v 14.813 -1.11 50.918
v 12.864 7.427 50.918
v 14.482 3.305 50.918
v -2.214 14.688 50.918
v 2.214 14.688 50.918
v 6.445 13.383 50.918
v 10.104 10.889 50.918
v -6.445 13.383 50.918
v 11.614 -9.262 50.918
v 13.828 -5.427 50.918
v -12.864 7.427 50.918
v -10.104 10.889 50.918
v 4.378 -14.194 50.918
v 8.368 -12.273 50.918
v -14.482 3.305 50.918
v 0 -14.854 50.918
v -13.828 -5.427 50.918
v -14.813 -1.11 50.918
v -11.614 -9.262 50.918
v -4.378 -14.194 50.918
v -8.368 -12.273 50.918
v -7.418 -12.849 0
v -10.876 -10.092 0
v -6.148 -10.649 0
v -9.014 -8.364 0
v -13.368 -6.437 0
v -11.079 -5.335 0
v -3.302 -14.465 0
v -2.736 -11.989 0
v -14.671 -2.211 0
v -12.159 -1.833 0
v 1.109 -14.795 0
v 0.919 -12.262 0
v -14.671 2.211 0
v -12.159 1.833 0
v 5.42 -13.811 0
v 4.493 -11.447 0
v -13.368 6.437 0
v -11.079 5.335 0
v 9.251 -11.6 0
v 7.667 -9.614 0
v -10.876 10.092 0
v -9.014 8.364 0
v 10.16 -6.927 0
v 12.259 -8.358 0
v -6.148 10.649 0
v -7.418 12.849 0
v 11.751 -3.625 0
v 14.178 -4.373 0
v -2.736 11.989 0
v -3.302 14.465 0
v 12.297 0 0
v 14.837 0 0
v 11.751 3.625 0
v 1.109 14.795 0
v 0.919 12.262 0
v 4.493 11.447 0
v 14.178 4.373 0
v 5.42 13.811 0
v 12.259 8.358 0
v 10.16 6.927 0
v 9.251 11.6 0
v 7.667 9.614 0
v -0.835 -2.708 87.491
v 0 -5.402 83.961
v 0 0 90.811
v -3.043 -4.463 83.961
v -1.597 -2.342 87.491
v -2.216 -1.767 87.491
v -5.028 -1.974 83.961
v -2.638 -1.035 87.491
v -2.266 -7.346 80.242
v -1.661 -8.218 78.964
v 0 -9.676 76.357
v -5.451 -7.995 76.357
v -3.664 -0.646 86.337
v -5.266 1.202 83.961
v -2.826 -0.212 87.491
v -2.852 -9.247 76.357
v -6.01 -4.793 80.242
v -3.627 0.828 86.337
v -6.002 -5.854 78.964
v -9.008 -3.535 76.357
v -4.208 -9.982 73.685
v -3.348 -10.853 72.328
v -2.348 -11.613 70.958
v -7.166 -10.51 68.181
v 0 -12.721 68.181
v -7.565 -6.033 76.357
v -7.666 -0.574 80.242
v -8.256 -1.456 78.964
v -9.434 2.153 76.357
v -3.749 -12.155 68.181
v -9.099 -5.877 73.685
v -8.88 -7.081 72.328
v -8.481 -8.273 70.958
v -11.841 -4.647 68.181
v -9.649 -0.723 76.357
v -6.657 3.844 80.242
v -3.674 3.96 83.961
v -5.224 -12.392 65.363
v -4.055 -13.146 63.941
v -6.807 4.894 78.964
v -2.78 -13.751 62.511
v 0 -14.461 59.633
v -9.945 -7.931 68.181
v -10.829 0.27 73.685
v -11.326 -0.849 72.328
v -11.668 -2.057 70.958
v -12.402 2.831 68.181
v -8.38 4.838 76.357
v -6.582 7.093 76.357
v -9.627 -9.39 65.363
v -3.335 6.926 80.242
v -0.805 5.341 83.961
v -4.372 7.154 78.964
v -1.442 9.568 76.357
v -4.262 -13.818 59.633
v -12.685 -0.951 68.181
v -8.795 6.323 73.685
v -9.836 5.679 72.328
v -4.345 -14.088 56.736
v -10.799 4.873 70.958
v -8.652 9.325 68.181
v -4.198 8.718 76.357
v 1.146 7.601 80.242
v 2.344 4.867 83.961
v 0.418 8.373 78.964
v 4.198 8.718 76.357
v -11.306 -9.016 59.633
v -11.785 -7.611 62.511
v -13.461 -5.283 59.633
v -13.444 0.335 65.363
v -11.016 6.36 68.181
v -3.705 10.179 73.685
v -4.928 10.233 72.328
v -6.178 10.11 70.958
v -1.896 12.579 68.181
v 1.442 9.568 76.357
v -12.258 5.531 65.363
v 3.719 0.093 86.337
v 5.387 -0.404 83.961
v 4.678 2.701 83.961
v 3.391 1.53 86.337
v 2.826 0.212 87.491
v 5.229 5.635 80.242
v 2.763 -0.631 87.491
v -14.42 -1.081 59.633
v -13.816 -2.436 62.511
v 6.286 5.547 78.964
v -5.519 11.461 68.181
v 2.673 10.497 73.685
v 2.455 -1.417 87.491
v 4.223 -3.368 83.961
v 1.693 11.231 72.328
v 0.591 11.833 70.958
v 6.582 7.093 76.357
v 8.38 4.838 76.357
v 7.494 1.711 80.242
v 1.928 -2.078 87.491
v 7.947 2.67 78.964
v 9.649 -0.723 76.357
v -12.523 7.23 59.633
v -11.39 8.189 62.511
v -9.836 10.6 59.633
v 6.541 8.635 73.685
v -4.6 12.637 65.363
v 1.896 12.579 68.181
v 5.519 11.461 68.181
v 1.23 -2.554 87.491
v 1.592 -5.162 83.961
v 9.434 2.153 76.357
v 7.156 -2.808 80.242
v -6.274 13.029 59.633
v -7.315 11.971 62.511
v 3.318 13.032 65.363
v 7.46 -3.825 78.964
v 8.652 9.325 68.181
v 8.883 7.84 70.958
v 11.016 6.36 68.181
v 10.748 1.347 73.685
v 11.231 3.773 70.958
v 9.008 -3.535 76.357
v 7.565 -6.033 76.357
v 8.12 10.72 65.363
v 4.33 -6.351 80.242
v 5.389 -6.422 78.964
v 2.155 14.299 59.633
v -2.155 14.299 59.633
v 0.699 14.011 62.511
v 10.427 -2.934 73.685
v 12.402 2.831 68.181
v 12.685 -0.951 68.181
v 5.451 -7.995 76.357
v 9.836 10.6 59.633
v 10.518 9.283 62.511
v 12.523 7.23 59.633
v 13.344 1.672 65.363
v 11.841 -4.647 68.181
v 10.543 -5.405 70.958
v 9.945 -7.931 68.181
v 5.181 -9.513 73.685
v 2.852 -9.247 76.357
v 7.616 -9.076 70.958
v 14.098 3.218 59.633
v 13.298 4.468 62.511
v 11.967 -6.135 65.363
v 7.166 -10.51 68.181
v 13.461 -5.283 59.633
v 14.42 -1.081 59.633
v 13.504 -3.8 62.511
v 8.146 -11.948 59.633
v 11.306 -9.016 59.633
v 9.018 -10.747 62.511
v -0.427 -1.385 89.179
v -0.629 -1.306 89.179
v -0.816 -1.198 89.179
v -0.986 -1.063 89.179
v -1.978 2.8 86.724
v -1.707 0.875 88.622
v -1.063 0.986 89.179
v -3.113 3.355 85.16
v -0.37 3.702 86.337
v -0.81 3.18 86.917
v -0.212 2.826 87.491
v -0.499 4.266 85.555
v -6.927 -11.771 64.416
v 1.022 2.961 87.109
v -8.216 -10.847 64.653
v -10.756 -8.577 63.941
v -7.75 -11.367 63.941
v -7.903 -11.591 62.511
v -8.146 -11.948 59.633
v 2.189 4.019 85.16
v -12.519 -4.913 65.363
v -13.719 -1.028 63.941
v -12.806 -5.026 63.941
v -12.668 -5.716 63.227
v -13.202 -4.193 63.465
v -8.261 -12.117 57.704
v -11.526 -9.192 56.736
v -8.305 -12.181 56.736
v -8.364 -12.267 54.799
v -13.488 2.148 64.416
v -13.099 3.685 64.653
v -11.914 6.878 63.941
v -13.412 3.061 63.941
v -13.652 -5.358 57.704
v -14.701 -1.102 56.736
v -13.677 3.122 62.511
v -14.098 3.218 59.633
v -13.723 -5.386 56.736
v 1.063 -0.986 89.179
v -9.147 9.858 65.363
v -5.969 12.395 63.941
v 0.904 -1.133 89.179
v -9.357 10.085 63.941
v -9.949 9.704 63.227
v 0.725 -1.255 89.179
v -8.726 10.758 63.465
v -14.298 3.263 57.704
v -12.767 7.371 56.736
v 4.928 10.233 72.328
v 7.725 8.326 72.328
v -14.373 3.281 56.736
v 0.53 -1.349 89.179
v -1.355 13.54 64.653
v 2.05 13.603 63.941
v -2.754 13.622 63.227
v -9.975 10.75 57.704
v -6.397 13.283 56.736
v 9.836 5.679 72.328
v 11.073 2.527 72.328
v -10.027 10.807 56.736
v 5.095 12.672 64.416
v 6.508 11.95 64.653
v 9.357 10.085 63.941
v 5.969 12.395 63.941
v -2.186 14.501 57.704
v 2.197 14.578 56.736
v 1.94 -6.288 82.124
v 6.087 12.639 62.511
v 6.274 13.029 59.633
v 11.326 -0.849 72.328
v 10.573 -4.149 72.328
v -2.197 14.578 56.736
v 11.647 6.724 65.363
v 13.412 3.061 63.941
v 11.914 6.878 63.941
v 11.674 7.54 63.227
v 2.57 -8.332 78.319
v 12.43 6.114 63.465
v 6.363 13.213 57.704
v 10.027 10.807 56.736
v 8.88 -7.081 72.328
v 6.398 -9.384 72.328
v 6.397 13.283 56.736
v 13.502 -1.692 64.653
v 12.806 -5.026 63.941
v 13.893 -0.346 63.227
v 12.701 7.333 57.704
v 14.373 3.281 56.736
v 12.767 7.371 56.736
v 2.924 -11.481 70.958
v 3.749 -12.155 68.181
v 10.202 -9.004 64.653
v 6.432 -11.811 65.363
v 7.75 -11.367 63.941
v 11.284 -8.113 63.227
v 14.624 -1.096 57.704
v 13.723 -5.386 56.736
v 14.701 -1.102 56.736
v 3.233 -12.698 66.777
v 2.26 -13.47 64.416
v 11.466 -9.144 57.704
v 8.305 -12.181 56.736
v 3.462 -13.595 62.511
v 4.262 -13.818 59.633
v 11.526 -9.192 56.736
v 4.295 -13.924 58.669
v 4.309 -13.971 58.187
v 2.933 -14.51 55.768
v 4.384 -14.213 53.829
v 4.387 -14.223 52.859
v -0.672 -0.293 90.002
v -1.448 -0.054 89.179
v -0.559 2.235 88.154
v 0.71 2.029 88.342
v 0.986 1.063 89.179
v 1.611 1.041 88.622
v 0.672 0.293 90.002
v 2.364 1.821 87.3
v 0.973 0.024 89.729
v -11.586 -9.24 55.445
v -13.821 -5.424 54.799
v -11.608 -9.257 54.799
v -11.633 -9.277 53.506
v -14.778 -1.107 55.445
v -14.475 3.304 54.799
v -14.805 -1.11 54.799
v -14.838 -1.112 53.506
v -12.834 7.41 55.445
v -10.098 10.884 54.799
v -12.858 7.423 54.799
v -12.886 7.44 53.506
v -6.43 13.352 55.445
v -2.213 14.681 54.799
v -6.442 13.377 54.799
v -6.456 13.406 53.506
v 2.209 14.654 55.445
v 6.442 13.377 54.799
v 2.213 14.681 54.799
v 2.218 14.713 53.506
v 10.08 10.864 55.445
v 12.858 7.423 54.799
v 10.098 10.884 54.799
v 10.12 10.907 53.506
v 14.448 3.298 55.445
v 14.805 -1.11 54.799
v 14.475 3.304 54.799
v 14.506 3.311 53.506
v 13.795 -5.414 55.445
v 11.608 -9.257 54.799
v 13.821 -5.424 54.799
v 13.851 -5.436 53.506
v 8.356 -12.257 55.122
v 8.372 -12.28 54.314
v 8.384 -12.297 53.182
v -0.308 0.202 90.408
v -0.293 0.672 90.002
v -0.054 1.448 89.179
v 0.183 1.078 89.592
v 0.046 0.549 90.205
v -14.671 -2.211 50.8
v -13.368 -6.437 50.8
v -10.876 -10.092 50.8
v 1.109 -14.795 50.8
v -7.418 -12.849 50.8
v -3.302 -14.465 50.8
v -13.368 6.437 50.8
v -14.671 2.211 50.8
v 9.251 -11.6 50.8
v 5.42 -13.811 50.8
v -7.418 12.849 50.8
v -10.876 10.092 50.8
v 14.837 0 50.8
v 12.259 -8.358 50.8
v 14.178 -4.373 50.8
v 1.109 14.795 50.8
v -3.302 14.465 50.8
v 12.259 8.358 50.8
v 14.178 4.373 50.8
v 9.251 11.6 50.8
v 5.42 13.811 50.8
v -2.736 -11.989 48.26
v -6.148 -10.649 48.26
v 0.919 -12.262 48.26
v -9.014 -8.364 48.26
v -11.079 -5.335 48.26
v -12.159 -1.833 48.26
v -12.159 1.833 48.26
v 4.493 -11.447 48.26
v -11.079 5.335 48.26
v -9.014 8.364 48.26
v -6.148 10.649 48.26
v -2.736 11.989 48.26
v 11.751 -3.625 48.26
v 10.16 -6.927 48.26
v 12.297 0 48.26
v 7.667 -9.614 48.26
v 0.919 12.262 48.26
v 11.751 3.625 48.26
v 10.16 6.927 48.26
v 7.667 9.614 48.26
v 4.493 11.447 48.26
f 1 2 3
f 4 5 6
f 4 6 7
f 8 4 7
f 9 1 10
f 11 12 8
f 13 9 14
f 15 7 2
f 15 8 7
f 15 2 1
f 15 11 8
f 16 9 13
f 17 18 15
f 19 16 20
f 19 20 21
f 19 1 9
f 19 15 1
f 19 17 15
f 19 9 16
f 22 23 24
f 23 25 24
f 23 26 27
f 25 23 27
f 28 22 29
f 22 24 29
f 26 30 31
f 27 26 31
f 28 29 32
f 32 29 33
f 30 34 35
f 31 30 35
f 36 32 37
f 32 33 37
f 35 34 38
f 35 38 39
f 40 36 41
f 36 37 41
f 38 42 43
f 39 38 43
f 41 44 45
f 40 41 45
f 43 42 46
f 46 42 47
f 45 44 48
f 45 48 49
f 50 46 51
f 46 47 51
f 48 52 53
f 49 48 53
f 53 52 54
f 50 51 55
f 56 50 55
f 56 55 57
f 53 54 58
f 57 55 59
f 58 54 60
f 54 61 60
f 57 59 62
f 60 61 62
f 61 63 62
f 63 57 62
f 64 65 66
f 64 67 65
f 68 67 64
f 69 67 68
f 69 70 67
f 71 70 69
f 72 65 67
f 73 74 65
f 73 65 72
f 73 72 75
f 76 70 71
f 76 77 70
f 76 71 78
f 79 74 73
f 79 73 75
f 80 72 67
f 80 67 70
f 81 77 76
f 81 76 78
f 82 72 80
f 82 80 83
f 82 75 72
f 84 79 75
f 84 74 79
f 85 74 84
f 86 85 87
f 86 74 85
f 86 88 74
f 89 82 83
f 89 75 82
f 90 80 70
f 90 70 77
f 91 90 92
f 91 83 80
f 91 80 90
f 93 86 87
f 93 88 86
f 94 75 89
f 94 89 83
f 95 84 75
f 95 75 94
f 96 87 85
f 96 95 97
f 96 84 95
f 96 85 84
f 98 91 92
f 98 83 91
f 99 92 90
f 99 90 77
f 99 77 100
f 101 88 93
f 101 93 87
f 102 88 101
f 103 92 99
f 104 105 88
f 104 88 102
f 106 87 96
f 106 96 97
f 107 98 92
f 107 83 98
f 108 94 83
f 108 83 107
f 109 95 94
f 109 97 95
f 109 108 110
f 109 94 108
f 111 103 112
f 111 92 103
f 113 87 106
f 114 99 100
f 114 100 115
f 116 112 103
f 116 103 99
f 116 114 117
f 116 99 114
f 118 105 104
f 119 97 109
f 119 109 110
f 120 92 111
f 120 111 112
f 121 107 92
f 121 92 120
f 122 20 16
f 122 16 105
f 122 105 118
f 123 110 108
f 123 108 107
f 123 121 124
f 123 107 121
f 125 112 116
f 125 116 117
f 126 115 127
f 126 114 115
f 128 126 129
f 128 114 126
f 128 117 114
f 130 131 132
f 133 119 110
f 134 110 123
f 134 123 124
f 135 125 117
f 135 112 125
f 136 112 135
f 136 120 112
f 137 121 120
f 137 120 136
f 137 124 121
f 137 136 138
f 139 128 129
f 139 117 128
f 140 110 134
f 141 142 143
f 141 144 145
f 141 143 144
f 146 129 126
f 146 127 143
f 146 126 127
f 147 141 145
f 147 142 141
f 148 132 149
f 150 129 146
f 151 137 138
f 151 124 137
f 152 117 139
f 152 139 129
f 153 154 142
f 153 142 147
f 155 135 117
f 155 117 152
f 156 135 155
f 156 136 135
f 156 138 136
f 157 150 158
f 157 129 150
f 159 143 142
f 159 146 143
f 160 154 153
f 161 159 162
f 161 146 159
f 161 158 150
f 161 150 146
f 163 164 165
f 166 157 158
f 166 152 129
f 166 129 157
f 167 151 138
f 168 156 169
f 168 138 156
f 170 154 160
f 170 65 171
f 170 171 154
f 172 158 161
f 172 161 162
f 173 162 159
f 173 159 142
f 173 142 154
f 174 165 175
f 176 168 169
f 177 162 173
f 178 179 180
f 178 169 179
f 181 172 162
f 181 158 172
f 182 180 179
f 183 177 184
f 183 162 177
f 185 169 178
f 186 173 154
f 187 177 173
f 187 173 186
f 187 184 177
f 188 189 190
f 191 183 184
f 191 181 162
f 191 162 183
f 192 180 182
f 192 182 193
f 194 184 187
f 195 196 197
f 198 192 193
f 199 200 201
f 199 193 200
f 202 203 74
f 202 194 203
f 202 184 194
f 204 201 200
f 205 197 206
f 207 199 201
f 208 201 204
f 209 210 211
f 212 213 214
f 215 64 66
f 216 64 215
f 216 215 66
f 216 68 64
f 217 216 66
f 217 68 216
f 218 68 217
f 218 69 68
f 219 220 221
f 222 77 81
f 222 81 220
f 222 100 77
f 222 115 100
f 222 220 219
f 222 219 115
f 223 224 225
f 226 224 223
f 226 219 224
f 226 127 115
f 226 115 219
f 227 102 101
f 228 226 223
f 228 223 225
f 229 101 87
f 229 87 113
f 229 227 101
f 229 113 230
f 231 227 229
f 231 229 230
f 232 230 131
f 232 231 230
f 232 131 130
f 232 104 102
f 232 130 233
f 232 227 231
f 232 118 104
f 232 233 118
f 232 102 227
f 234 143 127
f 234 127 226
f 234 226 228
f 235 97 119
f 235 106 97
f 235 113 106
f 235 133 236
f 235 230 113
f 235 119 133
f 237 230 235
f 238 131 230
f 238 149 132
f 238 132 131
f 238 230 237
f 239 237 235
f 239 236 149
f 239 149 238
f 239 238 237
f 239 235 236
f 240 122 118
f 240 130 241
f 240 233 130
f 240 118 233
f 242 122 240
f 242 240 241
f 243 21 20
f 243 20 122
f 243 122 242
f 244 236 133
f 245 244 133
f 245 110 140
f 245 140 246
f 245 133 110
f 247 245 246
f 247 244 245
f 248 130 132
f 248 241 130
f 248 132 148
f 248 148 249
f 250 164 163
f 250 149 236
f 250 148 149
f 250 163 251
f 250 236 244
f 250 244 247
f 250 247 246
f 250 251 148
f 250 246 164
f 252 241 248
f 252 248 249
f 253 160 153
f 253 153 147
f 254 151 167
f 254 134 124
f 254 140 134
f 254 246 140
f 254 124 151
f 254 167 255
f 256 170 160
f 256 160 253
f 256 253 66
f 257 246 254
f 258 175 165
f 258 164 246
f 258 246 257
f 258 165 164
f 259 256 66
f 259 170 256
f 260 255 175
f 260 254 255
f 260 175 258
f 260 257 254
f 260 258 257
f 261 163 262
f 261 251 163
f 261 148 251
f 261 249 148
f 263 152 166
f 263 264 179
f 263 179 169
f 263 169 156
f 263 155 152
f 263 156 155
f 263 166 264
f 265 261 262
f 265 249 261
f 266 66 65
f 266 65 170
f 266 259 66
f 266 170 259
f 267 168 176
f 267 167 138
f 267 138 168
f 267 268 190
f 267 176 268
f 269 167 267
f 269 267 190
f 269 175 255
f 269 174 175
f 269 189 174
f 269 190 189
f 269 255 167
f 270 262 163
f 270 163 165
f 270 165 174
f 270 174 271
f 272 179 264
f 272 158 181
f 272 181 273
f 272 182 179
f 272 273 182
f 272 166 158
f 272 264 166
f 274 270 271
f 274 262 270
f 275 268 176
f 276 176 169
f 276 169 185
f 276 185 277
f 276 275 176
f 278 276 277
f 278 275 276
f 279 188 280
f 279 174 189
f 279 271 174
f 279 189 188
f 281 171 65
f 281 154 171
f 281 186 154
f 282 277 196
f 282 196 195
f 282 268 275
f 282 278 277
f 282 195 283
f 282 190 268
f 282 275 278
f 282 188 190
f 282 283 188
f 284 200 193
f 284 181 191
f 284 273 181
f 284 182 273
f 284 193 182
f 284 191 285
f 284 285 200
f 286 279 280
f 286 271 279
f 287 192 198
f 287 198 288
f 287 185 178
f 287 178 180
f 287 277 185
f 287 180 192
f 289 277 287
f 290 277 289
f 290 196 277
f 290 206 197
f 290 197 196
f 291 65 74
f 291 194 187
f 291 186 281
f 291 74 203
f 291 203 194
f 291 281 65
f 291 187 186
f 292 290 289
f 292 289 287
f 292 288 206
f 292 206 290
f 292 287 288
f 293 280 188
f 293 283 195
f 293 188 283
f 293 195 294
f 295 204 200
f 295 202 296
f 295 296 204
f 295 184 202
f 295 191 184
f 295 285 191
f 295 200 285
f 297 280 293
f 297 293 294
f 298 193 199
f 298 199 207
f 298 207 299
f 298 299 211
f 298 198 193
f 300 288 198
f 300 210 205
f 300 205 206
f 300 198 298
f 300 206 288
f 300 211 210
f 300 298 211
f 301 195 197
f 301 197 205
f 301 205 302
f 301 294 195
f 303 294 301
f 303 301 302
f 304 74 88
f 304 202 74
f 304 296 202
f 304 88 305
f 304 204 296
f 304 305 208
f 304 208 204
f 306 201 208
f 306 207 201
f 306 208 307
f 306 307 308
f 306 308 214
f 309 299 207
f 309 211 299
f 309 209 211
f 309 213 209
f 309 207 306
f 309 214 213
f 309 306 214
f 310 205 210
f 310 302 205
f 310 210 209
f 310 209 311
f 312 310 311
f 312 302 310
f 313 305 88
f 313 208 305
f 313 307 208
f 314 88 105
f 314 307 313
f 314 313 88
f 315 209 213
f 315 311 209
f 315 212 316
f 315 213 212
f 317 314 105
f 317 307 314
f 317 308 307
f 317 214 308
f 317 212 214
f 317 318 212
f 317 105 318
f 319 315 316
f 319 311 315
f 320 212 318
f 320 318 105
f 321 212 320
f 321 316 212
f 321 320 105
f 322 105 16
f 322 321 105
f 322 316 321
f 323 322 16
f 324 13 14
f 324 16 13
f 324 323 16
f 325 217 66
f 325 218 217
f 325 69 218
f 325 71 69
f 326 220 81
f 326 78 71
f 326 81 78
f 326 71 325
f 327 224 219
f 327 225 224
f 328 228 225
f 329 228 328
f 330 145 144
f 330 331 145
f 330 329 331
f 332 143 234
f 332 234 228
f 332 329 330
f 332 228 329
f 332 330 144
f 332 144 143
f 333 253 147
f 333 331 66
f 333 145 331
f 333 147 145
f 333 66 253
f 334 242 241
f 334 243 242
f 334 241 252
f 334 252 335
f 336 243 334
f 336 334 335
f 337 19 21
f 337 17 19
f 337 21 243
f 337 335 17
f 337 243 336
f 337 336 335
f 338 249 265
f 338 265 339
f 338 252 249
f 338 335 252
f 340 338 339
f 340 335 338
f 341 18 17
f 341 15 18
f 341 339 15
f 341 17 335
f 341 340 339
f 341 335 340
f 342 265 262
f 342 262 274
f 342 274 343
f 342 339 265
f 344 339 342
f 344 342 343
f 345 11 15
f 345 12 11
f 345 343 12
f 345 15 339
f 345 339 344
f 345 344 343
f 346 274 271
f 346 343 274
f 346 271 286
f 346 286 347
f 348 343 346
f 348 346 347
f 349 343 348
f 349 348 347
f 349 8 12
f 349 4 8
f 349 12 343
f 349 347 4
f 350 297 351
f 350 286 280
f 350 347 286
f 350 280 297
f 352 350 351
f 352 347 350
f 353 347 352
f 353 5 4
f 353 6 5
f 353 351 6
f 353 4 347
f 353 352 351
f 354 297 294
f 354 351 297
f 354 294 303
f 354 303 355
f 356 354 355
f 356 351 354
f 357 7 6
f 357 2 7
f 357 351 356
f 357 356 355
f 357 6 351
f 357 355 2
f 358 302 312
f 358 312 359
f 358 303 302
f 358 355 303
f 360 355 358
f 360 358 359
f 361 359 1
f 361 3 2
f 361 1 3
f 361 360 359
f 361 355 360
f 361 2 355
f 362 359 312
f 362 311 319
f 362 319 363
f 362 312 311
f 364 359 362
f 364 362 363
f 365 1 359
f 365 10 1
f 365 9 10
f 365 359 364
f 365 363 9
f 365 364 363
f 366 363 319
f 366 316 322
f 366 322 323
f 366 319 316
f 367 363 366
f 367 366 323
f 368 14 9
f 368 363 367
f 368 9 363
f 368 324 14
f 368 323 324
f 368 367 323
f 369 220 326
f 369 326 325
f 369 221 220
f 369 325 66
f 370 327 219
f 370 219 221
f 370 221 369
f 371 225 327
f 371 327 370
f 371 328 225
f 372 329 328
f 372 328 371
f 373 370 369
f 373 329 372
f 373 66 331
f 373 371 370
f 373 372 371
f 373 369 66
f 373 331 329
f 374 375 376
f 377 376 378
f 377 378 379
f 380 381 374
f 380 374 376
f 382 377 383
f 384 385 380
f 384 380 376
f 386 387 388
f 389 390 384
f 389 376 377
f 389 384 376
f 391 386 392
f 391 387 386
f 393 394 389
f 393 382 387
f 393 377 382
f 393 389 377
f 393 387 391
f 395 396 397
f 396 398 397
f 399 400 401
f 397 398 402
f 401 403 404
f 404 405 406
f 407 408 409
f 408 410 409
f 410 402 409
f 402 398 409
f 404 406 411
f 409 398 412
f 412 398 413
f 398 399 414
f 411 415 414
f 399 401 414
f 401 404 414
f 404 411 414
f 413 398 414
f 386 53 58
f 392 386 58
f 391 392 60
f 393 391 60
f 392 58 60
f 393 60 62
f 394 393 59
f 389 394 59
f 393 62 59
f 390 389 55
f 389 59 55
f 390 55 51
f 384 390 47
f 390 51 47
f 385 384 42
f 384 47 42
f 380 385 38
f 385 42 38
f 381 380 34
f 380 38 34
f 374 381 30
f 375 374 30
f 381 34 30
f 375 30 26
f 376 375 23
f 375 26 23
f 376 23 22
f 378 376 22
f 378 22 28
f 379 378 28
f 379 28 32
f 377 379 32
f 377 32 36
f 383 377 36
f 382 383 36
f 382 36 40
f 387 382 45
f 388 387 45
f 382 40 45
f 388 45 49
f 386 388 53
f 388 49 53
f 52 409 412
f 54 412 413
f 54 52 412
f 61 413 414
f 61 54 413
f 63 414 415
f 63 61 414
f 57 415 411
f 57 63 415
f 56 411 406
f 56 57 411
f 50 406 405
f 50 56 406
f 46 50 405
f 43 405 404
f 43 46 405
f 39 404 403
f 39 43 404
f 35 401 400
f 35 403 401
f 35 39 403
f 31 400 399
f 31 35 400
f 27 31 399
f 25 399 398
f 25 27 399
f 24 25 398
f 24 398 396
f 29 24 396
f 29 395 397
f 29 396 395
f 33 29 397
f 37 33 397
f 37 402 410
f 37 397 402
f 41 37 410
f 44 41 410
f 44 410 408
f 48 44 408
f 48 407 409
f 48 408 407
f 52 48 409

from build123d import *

# Parameters (mm, degrees)
F0_R     = 14.836815
F1_DEPTH = 50.8
F4_T     = -2.54


with BuildPart() as f1:
    # F0 (on Top) → F1 (new body)
    with BuildSketch(Plane.XY):
        Circle(F0_R)
    extrude(amount=F1_DEPTH)

    # F4
    f4_openings = [f1.faces().sort_by_distance(p)[0] for p in [
        (0, 0, 0),
    ]]
    offset(amount=F4_T, openings=f4_openings)


with BuildPart() as f3:
    # F2 (on Right) → F3 (revolve)
    with BuildSketch(Plane.YZ):
        with BuildLine():
            Line((0, 52.033052), (0, 90.81091))
            ThreePointArc((0, 90.81091), (-11.357655, 72.328253), (-14.854391, 50.918493))
            Line((-14.854391, 50.918493), (0, 50.918493))
            Line((0, 50.918493), (0, 52.033052))
        make_face()
    revolve(axis=Axis((0, 0, 71.421981), (0, 0, -1)))


solid = Compound([f1.part, f3.part])
